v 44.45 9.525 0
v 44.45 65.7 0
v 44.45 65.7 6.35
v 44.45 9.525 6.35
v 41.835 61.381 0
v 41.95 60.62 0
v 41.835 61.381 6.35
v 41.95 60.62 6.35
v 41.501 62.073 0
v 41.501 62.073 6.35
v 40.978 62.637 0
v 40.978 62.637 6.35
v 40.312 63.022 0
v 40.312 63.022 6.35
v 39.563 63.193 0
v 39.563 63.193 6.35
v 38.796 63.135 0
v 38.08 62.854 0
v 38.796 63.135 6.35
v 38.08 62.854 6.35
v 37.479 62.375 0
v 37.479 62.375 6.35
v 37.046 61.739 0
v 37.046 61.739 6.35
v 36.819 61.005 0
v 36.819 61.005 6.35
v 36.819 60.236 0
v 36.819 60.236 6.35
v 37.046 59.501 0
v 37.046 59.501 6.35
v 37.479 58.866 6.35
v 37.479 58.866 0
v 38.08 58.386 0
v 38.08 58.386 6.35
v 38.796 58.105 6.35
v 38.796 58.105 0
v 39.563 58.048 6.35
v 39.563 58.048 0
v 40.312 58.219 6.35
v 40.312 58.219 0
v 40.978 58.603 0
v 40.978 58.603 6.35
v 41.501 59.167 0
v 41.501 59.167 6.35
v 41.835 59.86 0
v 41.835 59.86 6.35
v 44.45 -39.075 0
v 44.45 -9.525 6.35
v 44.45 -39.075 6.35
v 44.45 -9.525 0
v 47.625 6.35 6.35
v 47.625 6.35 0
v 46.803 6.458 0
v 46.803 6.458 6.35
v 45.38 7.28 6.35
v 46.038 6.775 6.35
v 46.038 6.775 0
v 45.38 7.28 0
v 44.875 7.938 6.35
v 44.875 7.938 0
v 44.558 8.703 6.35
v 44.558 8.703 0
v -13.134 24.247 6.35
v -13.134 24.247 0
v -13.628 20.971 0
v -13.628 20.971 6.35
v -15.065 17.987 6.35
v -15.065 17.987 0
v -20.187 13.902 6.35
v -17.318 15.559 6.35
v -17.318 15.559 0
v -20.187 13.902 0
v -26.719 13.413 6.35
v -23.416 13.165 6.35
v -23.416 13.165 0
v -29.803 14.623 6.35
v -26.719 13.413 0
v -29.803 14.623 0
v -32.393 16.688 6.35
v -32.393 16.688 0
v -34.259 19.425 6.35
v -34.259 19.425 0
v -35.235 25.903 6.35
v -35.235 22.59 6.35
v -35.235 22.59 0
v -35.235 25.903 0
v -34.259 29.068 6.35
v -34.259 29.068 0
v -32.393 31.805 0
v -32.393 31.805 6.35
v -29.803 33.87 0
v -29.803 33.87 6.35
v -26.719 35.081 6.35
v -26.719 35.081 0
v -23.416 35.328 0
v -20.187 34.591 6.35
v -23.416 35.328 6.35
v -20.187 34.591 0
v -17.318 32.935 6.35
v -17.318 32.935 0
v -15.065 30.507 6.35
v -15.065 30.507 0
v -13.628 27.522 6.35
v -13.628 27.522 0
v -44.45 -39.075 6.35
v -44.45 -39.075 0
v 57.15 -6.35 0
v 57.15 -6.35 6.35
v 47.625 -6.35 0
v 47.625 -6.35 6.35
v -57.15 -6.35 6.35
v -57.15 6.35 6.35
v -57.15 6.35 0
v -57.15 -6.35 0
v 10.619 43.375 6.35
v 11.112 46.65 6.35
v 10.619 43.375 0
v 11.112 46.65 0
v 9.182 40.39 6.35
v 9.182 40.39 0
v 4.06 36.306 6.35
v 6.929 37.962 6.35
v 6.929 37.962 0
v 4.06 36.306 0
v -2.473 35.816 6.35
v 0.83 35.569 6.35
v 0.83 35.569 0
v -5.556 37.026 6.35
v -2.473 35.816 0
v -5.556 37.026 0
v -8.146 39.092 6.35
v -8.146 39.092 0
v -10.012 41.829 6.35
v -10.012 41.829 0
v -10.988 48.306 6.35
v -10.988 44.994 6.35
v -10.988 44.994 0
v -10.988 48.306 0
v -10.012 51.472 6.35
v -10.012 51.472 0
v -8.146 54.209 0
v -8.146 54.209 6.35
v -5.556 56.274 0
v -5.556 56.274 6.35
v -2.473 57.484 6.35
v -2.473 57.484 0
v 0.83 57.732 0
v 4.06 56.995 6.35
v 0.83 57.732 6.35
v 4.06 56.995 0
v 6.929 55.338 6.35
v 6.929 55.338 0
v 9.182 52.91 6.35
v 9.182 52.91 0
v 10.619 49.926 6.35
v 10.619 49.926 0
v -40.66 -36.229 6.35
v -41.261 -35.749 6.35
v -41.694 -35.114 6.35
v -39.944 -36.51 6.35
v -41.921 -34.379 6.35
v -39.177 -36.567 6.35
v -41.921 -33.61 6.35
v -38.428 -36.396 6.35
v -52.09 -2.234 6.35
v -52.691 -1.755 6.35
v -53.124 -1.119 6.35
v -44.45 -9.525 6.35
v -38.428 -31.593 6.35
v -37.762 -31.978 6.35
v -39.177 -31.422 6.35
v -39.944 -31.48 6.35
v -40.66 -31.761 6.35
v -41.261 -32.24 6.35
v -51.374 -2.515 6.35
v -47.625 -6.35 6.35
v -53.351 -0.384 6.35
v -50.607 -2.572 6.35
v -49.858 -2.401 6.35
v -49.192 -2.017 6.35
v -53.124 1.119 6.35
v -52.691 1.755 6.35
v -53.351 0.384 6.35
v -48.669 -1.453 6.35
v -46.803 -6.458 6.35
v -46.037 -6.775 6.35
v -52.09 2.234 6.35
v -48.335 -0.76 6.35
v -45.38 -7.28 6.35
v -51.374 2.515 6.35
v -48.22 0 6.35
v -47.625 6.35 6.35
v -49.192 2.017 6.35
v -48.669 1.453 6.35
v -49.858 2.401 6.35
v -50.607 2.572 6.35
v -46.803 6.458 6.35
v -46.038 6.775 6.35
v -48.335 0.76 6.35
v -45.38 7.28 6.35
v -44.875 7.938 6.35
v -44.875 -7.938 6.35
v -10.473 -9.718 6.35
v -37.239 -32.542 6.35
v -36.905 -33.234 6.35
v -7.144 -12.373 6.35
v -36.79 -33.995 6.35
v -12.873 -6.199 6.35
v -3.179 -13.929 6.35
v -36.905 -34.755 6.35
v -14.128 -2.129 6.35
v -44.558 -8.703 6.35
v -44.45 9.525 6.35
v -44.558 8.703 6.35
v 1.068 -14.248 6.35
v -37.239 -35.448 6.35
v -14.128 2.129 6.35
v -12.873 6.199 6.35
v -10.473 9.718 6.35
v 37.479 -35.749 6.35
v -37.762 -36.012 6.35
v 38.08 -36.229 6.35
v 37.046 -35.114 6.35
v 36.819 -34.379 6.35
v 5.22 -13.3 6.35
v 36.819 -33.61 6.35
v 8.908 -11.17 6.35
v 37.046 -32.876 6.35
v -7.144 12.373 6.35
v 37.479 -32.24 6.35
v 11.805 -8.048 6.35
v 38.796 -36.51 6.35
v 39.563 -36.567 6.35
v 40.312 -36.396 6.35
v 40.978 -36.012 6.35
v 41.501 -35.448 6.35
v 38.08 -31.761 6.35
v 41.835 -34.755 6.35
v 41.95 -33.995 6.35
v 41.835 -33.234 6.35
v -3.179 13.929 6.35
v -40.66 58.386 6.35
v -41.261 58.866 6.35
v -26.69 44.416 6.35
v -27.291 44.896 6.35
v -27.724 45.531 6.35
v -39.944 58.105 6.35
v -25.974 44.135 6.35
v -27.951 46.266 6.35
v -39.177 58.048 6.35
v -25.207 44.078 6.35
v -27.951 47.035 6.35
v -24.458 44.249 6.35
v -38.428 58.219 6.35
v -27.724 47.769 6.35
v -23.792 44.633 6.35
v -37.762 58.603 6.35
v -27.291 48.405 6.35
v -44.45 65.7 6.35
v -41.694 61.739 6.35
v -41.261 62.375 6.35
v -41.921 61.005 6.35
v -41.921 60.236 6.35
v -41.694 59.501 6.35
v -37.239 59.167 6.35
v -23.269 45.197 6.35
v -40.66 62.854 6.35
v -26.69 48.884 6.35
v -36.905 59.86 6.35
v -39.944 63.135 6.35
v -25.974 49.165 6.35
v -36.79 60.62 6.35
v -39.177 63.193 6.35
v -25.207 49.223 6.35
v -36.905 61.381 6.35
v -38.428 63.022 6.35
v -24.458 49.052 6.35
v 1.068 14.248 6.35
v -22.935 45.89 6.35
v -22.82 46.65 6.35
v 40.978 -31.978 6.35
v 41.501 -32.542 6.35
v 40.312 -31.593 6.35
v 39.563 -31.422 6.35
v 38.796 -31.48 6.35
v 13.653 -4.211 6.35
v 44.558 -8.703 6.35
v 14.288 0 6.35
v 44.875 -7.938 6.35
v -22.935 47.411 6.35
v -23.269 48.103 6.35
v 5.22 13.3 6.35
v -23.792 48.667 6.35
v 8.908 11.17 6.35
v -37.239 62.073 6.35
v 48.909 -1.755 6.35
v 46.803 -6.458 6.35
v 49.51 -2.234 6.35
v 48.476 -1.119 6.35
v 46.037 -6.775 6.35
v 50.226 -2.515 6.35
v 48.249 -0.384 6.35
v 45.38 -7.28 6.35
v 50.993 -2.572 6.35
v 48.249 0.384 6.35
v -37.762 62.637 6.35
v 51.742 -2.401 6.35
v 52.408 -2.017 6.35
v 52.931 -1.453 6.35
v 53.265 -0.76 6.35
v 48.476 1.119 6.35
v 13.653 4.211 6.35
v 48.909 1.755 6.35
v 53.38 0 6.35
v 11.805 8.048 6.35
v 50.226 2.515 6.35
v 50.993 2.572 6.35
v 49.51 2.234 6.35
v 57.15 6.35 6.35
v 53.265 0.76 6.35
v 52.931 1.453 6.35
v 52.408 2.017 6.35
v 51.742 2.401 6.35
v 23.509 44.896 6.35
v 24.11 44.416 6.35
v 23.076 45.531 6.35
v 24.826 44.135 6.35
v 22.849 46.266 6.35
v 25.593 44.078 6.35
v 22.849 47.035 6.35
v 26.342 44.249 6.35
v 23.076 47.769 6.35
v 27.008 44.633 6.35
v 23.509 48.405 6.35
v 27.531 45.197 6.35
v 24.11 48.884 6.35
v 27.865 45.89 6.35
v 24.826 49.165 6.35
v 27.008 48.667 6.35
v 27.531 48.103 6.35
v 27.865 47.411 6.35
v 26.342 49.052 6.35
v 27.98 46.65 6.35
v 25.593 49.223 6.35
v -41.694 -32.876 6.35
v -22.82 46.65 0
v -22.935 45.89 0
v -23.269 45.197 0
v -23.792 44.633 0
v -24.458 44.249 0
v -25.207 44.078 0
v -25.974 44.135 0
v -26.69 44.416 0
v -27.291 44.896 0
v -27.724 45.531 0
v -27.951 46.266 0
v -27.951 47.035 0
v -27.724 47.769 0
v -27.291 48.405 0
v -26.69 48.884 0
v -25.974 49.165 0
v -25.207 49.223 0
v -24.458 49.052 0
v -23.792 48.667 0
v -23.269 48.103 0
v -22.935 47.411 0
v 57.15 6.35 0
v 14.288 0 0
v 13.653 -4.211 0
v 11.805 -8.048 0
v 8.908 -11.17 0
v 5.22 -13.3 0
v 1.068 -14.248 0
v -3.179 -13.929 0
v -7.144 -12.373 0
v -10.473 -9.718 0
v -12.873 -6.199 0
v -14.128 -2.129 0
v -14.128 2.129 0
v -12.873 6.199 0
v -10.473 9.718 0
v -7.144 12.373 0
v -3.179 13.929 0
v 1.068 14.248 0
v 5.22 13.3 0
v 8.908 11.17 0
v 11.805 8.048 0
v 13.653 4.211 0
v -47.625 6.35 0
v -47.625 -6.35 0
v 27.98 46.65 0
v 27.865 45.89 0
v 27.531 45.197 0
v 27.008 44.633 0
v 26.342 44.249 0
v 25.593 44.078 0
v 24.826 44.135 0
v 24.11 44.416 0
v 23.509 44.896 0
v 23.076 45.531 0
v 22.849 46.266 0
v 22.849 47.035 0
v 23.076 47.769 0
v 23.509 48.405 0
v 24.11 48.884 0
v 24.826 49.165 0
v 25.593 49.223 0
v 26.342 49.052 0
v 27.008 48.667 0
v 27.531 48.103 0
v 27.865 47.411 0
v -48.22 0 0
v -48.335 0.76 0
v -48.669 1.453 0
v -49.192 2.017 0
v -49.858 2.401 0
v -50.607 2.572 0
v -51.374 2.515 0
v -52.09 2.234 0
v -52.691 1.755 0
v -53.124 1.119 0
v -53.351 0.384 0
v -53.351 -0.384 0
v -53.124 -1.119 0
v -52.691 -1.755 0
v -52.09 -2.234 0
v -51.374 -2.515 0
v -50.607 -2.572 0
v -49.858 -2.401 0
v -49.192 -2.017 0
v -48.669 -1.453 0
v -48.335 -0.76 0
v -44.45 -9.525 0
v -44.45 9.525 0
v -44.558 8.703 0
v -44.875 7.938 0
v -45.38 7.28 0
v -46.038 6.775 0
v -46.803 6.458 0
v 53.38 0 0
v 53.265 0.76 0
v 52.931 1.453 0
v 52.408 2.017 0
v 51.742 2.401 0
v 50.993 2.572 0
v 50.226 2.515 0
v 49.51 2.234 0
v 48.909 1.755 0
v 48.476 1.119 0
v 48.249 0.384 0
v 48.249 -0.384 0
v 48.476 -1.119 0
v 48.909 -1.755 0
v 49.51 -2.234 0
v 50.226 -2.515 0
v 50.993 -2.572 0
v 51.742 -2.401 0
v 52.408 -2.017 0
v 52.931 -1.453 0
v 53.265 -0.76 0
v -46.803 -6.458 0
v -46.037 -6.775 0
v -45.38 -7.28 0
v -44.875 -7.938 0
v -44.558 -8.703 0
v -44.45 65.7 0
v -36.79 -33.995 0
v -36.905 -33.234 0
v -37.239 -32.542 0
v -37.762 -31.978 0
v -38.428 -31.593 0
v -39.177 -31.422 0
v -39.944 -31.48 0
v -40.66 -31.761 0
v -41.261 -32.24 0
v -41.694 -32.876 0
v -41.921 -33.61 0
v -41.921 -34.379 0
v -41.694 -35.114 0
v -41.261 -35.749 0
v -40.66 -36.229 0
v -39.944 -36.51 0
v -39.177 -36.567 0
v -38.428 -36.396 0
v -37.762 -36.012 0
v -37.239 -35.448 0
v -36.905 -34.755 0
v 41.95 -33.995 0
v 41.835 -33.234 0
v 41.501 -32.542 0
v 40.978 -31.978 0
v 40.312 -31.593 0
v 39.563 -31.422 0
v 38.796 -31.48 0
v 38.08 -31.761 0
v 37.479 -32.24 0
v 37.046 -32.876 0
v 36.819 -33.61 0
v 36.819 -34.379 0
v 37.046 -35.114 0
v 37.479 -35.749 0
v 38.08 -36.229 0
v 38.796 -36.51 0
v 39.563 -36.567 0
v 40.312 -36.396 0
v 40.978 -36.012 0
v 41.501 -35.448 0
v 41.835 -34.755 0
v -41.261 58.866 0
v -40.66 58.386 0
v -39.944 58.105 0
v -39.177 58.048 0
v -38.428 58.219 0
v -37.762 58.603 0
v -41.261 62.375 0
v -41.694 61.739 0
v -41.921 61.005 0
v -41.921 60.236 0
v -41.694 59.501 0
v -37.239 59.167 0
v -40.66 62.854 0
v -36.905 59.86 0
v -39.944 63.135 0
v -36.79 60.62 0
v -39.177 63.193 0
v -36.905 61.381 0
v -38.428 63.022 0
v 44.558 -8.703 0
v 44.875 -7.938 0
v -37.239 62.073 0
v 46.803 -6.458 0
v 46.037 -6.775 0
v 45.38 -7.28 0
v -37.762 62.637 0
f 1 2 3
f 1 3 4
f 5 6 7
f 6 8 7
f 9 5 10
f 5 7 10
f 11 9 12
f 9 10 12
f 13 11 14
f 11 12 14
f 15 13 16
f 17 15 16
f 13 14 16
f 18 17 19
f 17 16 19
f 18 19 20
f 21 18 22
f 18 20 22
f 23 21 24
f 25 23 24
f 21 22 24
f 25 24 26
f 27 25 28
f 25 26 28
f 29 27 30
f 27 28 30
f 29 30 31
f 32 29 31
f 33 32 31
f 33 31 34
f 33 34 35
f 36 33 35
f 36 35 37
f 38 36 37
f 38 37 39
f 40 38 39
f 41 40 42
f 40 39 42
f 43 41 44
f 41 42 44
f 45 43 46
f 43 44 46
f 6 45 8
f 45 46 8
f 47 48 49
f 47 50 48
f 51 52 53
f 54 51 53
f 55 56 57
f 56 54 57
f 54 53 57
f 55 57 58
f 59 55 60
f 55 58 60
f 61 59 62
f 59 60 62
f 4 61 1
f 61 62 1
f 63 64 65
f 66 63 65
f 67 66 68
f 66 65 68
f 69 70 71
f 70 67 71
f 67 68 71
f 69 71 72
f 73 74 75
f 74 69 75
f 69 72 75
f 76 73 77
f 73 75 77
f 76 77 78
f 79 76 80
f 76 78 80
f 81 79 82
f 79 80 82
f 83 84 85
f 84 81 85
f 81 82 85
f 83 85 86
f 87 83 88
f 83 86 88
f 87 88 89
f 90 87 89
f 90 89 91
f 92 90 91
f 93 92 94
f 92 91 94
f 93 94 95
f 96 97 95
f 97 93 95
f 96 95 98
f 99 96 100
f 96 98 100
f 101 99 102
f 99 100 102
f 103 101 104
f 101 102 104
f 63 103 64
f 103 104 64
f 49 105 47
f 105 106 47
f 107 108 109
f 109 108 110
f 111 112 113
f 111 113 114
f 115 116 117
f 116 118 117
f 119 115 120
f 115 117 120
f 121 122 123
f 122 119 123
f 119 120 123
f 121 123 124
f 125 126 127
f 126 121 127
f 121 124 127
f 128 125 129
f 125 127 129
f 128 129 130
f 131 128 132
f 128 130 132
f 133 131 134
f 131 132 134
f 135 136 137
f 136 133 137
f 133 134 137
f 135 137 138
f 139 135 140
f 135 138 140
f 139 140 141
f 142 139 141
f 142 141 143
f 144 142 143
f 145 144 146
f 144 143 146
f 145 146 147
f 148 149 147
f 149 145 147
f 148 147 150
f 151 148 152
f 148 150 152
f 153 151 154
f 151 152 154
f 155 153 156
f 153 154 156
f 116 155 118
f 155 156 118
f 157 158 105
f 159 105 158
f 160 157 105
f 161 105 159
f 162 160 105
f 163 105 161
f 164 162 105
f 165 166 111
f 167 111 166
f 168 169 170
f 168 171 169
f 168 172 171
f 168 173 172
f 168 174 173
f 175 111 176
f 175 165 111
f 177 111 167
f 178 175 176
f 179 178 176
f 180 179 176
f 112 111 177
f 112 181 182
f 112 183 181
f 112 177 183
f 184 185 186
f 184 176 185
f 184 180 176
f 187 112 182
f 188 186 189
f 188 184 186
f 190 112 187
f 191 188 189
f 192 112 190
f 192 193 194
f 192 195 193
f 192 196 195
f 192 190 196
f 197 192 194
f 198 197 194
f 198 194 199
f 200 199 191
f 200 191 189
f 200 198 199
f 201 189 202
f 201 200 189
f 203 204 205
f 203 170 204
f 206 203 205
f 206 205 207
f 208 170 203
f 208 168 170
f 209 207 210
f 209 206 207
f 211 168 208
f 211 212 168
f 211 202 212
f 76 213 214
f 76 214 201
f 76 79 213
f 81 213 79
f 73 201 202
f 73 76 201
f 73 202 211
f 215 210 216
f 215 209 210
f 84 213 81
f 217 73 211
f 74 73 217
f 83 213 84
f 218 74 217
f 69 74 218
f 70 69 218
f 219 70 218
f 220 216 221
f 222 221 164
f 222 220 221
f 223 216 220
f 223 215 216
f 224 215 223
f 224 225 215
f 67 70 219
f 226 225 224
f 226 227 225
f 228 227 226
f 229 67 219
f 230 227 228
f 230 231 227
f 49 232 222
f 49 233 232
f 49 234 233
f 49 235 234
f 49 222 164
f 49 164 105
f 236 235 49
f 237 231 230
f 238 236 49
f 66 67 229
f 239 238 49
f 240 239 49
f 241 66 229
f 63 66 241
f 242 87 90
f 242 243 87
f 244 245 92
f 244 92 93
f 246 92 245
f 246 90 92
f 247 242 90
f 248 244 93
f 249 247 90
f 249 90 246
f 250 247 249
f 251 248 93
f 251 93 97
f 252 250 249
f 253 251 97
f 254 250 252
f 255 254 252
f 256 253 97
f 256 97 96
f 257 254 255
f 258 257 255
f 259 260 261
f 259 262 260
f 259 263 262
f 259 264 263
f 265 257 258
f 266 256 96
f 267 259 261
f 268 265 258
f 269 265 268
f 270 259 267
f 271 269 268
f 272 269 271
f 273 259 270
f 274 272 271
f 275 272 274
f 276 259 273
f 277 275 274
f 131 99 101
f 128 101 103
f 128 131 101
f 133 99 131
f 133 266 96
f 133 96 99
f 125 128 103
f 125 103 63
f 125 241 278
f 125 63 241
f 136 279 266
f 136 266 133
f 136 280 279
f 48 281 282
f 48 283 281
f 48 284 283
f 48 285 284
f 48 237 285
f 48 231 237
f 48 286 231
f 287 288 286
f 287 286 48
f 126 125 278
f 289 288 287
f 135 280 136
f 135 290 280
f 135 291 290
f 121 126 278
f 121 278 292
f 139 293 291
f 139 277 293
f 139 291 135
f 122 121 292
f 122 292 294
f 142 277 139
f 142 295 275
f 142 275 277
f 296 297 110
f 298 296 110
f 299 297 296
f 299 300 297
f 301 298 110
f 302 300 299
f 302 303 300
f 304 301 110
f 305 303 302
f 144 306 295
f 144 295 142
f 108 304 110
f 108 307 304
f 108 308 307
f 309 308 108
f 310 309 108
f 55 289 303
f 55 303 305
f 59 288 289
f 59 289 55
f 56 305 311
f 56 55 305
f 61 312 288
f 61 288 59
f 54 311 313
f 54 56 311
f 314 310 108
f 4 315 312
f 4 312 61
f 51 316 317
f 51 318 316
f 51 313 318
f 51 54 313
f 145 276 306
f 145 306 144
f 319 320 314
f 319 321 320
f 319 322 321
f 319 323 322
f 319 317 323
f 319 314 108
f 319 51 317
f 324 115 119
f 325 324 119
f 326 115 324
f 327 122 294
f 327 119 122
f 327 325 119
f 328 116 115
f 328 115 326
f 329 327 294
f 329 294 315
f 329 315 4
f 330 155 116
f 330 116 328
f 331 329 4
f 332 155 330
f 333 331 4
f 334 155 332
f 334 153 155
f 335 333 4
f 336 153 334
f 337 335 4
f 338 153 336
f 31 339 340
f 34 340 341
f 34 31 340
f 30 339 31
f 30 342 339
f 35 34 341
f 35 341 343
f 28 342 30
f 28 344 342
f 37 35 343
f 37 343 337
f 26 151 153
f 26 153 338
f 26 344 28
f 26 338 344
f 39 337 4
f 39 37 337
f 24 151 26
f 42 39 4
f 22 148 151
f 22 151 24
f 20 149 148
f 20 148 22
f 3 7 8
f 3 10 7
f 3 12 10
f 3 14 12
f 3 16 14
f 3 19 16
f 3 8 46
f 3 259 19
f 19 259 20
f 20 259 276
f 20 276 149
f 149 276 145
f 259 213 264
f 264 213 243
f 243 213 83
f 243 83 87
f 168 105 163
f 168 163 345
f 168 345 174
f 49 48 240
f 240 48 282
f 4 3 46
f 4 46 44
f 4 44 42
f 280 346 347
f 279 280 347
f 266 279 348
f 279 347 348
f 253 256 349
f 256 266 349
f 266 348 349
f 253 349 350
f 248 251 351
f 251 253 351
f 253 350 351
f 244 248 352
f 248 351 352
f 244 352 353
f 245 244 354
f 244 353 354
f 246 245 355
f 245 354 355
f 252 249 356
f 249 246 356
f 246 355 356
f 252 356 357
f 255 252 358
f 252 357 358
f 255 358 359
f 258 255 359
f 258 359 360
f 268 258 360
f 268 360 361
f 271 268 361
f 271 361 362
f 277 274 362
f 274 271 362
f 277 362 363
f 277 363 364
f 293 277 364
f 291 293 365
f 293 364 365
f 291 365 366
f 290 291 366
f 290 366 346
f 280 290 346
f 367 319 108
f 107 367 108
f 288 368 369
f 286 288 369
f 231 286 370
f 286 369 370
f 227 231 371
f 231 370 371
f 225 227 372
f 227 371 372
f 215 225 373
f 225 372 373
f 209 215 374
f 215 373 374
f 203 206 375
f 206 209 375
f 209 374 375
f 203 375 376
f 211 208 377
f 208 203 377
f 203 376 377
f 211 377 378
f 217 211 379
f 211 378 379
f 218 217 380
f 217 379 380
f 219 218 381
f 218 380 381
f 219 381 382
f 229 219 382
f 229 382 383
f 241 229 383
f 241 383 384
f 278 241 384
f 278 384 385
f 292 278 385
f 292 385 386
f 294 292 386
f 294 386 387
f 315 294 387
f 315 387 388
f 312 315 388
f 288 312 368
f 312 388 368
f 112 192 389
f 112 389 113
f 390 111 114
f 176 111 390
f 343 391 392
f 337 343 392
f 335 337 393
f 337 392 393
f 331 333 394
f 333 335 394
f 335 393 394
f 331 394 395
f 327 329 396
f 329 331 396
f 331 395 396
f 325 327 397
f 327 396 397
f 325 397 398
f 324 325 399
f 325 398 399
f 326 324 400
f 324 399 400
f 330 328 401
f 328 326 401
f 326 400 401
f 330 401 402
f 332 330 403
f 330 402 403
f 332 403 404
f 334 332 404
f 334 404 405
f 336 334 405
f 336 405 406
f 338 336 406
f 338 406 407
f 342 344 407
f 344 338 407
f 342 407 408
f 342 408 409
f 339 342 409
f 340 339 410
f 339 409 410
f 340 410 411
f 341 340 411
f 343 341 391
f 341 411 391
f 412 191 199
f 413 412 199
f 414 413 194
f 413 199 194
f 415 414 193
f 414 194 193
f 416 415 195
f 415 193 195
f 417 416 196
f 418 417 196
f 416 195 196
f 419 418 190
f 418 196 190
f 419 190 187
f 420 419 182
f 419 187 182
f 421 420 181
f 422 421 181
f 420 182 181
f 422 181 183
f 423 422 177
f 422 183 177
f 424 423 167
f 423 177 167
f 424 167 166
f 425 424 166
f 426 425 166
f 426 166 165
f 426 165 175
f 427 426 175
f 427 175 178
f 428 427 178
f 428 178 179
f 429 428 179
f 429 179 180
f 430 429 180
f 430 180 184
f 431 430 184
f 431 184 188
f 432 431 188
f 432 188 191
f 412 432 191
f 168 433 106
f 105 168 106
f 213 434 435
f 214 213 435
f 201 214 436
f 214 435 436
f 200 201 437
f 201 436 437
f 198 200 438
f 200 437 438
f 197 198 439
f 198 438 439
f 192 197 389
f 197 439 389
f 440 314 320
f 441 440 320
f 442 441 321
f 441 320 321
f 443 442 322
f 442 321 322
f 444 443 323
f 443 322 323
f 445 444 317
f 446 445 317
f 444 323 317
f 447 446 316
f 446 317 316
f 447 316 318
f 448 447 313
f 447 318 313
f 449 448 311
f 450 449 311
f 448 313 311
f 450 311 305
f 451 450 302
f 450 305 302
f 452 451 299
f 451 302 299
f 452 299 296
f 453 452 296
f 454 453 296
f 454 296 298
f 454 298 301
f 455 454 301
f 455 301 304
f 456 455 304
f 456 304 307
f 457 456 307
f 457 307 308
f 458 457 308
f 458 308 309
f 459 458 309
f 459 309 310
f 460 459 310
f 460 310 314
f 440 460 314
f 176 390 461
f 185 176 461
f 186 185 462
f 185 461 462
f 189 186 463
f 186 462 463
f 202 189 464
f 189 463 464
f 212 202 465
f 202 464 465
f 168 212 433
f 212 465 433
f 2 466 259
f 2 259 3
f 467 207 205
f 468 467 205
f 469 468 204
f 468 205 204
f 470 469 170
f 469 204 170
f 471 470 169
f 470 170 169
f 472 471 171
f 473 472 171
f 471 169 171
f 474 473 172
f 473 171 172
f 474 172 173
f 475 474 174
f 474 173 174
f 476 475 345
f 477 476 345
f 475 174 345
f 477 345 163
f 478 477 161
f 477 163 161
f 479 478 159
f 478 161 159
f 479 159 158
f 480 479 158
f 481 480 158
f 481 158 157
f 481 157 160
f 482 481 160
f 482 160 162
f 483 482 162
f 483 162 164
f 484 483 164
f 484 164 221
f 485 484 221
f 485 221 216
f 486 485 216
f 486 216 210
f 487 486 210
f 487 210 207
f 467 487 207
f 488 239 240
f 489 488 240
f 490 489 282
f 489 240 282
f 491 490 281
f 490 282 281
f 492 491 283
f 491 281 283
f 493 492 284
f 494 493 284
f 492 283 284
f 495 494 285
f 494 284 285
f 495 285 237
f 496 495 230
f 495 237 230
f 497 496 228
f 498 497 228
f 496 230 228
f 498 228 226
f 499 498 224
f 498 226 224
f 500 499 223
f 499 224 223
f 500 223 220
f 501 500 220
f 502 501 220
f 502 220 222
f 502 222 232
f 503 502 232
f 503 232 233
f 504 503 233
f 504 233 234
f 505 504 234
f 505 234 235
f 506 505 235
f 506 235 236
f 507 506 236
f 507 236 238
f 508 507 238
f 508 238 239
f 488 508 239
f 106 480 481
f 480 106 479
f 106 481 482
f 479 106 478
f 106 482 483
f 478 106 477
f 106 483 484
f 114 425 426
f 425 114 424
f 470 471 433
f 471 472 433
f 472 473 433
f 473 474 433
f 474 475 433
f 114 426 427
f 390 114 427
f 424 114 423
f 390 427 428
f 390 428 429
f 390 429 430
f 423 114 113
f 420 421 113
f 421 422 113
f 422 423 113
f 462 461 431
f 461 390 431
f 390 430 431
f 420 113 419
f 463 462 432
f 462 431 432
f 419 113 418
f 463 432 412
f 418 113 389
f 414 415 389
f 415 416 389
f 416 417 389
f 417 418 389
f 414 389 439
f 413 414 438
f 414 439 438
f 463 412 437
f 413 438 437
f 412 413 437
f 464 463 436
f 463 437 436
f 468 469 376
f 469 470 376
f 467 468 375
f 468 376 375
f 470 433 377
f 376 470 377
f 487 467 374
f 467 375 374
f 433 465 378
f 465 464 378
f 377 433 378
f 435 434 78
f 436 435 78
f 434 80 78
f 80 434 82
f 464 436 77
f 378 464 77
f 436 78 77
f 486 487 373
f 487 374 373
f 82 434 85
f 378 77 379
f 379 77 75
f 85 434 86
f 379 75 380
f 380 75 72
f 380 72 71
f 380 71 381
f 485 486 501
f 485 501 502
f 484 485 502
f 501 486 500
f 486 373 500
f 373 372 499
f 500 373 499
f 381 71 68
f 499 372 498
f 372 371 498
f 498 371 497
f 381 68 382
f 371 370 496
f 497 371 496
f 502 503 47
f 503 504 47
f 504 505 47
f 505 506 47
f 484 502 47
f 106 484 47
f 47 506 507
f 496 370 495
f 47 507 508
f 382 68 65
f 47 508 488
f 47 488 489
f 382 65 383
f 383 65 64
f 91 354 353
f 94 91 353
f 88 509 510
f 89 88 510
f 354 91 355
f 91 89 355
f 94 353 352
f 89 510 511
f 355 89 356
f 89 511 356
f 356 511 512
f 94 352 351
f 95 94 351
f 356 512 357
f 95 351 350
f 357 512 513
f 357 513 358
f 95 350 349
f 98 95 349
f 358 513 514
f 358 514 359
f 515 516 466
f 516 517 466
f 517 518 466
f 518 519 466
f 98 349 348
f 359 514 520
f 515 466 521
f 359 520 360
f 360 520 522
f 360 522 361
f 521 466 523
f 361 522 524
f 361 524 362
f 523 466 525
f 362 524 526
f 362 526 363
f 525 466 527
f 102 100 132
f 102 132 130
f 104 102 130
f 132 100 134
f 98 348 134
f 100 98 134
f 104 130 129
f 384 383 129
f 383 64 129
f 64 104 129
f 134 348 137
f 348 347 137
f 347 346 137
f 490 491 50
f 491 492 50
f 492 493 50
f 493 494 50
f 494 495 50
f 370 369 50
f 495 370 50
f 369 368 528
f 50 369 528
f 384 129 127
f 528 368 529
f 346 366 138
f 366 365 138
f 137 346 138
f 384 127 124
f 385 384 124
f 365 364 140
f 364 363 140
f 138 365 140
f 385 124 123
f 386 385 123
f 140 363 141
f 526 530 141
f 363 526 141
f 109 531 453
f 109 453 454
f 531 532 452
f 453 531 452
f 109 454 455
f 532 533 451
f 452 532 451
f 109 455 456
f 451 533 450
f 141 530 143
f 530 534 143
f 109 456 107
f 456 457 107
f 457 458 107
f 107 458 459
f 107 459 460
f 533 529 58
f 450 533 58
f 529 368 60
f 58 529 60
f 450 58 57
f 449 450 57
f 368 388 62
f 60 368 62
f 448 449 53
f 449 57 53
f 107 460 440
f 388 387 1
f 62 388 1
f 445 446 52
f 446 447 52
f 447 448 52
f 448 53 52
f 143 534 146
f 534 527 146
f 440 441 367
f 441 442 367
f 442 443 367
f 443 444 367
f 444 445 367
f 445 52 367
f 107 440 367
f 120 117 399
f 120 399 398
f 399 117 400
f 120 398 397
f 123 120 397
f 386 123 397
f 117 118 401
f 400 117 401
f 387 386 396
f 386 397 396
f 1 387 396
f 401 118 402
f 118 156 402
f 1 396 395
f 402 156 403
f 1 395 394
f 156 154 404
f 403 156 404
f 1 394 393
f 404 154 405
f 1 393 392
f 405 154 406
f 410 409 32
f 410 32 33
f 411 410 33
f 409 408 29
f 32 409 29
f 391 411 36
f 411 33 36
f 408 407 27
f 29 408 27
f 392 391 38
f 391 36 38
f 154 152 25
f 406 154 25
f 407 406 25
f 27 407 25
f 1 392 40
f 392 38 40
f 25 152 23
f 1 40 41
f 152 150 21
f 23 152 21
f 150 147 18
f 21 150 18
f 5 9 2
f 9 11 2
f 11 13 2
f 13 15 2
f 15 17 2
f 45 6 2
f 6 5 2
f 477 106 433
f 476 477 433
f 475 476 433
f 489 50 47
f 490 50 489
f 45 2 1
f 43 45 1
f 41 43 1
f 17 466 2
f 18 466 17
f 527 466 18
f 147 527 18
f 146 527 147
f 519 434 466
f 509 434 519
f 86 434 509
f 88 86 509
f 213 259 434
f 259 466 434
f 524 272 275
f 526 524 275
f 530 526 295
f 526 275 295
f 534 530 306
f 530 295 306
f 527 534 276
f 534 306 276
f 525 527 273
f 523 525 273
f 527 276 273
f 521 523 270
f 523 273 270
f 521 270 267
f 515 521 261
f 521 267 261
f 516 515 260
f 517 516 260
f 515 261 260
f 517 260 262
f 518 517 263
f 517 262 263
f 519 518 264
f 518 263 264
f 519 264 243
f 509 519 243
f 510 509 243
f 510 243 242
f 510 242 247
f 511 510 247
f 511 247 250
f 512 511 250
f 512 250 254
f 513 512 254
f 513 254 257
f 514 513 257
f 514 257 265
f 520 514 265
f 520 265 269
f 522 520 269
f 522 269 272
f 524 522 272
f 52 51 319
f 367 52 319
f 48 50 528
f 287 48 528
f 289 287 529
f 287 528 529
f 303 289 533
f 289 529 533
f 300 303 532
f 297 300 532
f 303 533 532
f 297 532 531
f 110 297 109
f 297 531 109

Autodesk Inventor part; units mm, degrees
ref_plane "YZ Plane" through (0, 0, 0) normal (1, 0, 0) x (0, 1, 0)
ref_plane "XZ Plane" through (0, 0, 0) normal (0, 1, 0) x (-1, 0, 0)
ref_plane "XY Plane" through (0, 0, 0) normal (0, 0, 1) x (1, 0, 0)
sketch "Sketch1" plane through (0, 0, 0) normal (0, 0, 1) x (1, 0, 0)
  circle A0 centre (0, 0) radius 14.2875
  line L0 (0, 0) -> (-24.2467, 24.2467) construction
  line L1 (0, 0) -> (34.29, 0) construction
  circle A1 centre (-24.2467, 24.2467) radius 11.1125
  line L2 (-24.2467, 24.2467) -> (8.7733, 24.2467) construction
  line L3 (-24.2467, 24.2467) -> (0, 24.2467) construction
  line L4 (0, 24.2467) -> (0, 46.6502) construction
  line L5 (0, 46.6502) -> (-24.2467, 24.2467) construction
  circle A2 centre (0, 46.6502) radius 11.1125
  line L6 (0, 46.6502) -> (-25.4, 46.6502) construction
  line L7 (-25.4, 46.6502) -> (25.4, 46.6502) construction
  circle A3 centre (-25.4, 46.6502) radius 2.5797
  circle A4 centre (25.4, 46.6502) radius 2.5797
  line L8 (0, 46.6502) -> (0, 65.7002) construction
  line L9 (0, 65.7002) -> (44.45, 65.7002)
  line L10 (44.45, 65.7002) -> (44.45, -39.0748)
  line L11 (0, 65.7002) -> (-44.45, 65.7002)
  line L12 (-44.45, 65.7002) -> (-44.45, -39.0748)
  line L13 (-44.45, -39.0748) -> (44.45, -39.0748)
  dimension "d0" = 28.575
  dimension "d1" = 34.29
  dimension "d2" = 135
  dimension "d3" = 22.225
  dimension "d7" = 22.4035
  dimension "d8" = 22.225
  dimension "d9" = 25.4
  dimension "d10" = 50.8
  dimension "d11" = 5.1594
  dimension "d12" = 19.05
  dimension "d13" = 104.775
  dimension "d14" = 44.45
  dimension "d17" = 44.45
  dimension "d23" = 5.1594
extrude "Extrusion1" add sketch "Sketch1" along normal blind 6.35
sketch "Sketch2" plane through (0, 0, 6.35) normal (0, 0, 1) x (1, 0, 0)
  line L0 (-44.45, 65.7002) -> (-39.37, 65.7002) construction
  line L1 (-44.45, 65.7002) -> (44.45, 65.7002) construction
  line L2 (-39.37, 65.7002) -> (-39.37, 60.6202) construction
  circle A0 centre (-39.37, 60.6202) radius 2.5797
  line L3 (0, 65.7002) -> (0, -39.0748) construction
  line L4 (-44.45, -39.0748) -> (44.45, -39.0748) construction
  line L5 (44.45, -39.0748) -> (44.45, 65.7002) construction
  line L6 (44.45, 13.3127) -> (-44.45, 13.3127) construction
  circle A1 centre (39.37, 60.6202) radius 2.5797
  circle A2 centre (-39.37, -33.9948) radius 2.5797
  circle A3 centre (39.37, -33.9948) radius 2.5797
  point P0 (0, 0)
  dimension "d18" = 5.08
  dimension "d19" = 5.08
  dimension "d20" = 5.1594
extrude "Extrusion2" cut sketch "Sketch2" against normal blind 25.4
sketch "Sketch3" plane through (0, 0, 6.35) normal (0, 0, 1) x (1, 0, 0)
  line L0 (44.45, 65.7002) -> (44.45, -39.0748) construction
  line L1 (44.45, 0) -> (44.45, 6.35) construction
  line L2 (44.45, 6.35) -> (57.15, 6.35)
  line L3 (57.15, 6.35) -> (57.15, -6.35)
  line L4 (57.15, -6.35) -> (44.45, -6.35)
  line L5 (44.45, -6.35) -> (44.45, 6.35)
  circle A0 centre (50.8, 0) radius 2.5797
  line L6 (0, 18.1836) -> (0, -18.812) construction
  line L7 (-44.45, 65.7002) -> (-44.45, -39.0748) construction
  line L8 (-44.45, 0) -> (-44.45, 6.35) construction
  line L9 (-44.45, 6.35) -> (-57.15, 6.35)
  line L10 (-57.15, 6.35) -> (-57.15, -6.35)
  line L11 (-57.15, -6.35) -> (-44.45, -6.35)
  line L12 (-44.45, -6.35) -> (-44.45, 6.35)
  circle A1 centre (-50.8, 0) radius 2.5797
  point P0 (0, 0)
  dimension "d24" = 6.35
  dimension "d25" = 12.7
  dimension "d26" = 12.7
  dimension "d27" = 5.1594
extrude "Extrusion3" add sketch "Sketch3" against normal blind 6.35
fillet "Fillet1" radius 3.175 4 edges at (44.45, 6.35, 3.175) (44.45, -6.35, 3.175) (-44.45, -6.35, 3.175) (-44.45, 6.35, 3.175)
properties part number "Gearbox Plate"
